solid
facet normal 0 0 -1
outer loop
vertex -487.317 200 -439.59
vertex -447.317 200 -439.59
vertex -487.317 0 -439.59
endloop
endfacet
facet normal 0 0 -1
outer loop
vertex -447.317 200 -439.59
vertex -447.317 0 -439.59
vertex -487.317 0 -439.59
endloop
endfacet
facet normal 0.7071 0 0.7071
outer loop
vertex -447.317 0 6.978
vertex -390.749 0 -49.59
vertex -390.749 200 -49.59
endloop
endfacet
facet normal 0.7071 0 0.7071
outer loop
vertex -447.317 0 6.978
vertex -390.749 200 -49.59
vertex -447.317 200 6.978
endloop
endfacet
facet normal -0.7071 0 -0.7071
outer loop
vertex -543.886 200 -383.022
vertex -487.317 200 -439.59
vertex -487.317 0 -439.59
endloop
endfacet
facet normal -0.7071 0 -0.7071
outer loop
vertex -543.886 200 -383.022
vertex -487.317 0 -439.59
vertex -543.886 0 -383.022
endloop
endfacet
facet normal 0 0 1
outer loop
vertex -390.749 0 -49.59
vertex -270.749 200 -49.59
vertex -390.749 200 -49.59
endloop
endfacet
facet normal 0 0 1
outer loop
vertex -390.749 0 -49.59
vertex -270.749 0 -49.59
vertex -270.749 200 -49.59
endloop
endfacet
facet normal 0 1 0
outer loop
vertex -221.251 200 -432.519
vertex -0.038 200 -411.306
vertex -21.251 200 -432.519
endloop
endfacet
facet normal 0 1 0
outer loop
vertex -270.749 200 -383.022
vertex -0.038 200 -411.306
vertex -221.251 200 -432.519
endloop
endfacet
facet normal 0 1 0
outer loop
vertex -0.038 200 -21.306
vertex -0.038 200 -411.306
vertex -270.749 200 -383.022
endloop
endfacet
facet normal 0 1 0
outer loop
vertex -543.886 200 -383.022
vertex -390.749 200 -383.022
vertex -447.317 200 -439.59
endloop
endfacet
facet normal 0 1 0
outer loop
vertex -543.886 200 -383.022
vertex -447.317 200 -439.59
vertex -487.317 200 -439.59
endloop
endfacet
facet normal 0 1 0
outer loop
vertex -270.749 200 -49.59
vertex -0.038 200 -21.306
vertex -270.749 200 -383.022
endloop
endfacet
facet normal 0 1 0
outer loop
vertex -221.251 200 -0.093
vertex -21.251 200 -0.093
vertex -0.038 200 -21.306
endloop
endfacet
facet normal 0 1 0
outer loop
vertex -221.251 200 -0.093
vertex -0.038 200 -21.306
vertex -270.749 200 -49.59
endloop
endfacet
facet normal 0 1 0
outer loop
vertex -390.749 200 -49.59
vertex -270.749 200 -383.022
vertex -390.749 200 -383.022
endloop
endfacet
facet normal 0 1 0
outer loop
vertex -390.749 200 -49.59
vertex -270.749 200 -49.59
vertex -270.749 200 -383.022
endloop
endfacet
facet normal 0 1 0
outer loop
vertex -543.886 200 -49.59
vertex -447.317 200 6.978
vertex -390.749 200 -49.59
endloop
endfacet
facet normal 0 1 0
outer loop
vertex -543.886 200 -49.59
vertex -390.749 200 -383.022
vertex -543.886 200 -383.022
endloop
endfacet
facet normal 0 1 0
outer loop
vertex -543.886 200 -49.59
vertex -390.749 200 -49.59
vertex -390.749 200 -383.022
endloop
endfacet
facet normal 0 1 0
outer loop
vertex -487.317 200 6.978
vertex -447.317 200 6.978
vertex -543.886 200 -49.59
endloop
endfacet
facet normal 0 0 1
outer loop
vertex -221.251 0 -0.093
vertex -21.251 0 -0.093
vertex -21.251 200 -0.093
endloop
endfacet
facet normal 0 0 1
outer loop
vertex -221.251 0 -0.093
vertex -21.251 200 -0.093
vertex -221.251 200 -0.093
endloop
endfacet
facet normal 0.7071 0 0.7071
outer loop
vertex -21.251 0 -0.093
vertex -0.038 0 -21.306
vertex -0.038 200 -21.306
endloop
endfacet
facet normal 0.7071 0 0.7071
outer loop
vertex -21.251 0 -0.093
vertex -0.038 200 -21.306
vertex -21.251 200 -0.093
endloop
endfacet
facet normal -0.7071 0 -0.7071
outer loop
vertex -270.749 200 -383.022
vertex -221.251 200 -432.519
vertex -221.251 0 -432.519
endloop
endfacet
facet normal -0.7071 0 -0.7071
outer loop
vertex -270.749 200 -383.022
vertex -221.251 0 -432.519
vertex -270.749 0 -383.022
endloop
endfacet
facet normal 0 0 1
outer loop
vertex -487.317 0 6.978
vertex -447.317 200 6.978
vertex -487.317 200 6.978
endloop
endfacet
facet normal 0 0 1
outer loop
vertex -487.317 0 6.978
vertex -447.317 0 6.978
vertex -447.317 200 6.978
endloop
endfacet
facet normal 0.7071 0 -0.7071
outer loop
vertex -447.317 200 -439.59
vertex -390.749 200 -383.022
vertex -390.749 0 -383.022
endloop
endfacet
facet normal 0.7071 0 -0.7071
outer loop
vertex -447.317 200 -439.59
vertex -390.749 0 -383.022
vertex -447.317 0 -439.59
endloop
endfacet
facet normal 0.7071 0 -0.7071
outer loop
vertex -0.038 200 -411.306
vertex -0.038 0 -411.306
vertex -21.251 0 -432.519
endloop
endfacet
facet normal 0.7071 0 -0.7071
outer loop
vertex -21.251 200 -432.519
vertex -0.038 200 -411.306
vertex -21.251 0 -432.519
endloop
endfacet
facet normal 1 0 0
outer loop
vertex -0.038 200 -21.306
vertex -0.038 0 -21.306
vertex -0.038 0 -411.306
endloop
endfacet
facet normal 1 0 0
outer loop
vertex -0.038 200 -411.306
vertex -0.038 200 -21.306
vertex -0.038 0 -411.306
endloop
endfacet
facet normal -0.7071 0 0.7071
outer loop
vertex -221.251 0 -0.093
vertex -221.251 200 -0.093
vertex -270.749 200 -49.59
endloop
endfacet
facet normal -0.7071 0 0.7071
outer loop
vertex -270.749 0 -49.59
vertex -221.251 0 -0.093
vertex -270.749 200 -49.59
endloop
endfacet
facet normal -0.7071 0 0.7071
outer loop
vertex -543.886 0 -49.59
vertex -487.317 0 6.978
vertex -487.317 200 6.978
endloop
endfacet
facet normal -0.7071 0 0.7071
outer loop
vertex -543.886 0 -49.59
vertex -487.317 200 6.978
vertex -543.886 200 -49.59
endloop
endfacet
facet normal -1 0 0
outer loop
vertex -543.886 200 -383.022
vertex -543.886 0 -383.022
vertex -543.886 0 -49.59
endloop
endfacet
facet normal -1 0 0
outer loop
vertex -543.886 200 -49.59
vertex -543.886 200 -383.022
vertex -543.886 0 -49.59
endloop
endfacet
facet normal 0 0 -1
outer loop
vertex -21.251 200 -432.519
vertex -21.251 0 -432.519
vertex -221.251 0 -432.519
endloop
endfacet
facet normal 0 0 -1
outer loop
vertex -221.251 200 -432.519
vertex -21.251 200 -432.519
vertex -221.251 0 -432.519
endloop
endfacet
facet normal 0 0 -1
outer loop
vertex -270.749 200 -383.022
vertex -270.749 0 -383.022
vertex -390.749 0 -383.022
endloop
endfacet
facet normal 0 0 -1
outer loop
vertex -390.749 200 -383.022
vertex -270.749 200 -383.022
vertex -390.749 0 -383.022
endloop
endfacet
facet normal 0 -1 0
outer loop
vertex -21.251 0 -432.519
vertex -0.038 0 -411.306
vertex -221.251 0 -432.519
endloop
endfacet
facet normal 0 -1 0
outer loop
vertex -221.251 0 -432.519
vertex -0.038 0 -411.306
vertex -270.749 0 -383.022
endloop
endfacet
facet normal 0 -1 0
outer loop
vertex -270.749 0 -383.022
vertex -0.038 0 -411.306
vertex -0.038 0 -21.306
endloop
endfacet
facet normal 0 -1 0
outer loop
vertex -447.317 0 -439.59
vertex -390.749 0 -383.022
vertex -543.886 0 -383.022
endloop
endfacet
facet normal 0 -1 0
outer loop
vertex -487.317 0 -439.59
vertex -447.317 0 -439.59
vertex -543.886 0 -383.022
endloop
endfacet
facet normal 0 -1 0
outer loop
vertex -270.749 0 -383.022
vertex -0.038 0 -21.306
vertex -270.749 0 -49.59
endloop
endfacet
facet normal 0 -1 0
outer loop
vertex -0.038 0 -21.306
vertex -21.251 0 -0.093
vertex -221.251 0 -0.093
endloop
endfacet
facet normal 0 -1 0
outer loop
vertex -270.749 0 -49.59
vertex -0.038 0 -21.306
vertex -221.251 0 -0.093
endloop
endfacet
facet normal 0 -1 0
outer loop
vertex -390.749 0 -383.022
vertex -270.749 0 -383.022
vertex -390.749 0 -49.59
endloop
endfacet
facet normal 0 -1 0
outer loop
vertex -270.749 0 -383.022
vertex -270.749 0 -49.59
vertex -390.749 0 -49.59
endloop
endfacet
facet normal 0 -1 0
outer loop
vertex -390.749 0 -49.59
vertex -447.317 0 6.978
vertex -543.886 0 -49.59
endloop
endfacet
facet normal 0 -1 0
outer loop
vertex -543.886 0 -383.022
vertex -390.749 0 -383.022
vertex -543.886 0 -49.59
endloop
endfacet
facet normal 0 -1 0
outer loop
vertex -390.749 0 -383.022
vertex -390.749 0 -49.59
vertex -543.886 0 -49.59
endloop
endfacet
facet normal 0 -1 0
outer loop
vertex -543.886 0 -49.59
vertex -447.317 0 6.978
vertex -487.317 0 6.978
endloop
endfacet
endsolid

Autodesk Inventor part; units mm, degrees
ref_plane "YZ Plane" through (0, 0, 0) normal (1, 0, 0) x (0, 1, 0)
ref_plane "XZ Plane" through (0, 0, 0) normal (0, 1, 0) x (-1, 0, 0)
ref_plane "XY Plane" through (0, 0, 0) normal (0, 0, 1) x (1, 0, 0)
sketch "Sketch1" plane through (0, 0, 0) normal (0, 1, 0) x (-1, 0, 0)
  line L0 (0.0381, -21.3061) -> (0.0381, -411.3061)
  line L1 (0.0381, -411.3061) -> (21.2513, -432.5193)
  line L2 (0.0381, -411.3061) -> (30.0381, -411.3061) construction
  line L3 (21.2513, -432.5193) -> (221.2513, -432.5193)
  line L4 (221.2513, -432.5193) -> (270.7487, -383.0218)
  line L5 (270.7487, -383.0218) -> (390.7487, -383.0218)
  line L6 (390.7487, -383.0218) -> (447.3173, -439.5904)
  line L7 (447.3173, -439.5904) -> (487.3173, -439.5904)
  line L8 (487.3173, -439.5904) -> (543.8858, -383.0218)
  line L9 (-53.2718, -216.3061) -> (592.6367, -216.3061) construction
  line L10 (0.0381, -21.3061) -> (21.2513, -0.0929)
  line L11 (21.2513, -0.0929) -> (221.2513, -0.0929)
  line L12 (221.2513, -0.0929) -> (270.7487, -49.5904)
  line L13 (270.7487, -49.5904) -> (390.7487, -49.5904)
  line L14 (390.7487, -49.5904) -> (447.3173, 6.9782)
  line L15 (447.3173, 6.9782) -> (487.3173, 6.9782)
  line L16 (487.3173, 6.9782) -> (543.8858, -49.5904)
  line L17 (543.8858, -383.0218) -> (543.8858, -49.5904)
  point P0 (0, 0)
  dimension "d0" = 390
  dimension "d1" = 30
  dimension "d2" = 45
  dimension "d3" = 70
  dimension "d4" = 135
  dimension "d5" = 200
  dimension "d6" = 120
  dimension "d7" = 80
  dimension "d8" = 135
  dimension "d9" = 226.066
  dimension "d10" = 21.2132
  dimension "d11" = 40
  dimension "d12" = 80
  dimension "d15" = 543.8478
extrude "Extrusion1" add sketch "Sketch1" along normal blind 200
sketch "Sketch2" plane through (-221.2513, 0, -0.0929) normal (0, 0, 1) x (1, 0, 0)
  line L0 (200, 0) -> (200, 200) construction
  line L1 (200, 50) -> (-356.3945, 50) construction
  line L2 (0, 0) -> (200, 0) construction
  line L3 (91.2132, 236.2215) -> (91.2132, -57.6692) construction
  line L4 (221.2132, 0) -> (221.2132, 200) construction
  point P0 (221.2513, 0)
  dimension "d18" = 50
  dimension "d19" = 130
sketch "Sketch3" plane through (-221.2513, 0, -0.0929) normal (0, 0, 1) x (1, 0, 0)
  line L0 (91.2132, 236.2215) -> (91.2132, -57.6692) construction
  line L1 (200, 50) -> (-356.3945, 50) construction
  circle A0 centre (91.2132, 50) radius 25
  point P0 (221.2513, 0)
  dimension "d20" = 50
properties part number "Frame"
